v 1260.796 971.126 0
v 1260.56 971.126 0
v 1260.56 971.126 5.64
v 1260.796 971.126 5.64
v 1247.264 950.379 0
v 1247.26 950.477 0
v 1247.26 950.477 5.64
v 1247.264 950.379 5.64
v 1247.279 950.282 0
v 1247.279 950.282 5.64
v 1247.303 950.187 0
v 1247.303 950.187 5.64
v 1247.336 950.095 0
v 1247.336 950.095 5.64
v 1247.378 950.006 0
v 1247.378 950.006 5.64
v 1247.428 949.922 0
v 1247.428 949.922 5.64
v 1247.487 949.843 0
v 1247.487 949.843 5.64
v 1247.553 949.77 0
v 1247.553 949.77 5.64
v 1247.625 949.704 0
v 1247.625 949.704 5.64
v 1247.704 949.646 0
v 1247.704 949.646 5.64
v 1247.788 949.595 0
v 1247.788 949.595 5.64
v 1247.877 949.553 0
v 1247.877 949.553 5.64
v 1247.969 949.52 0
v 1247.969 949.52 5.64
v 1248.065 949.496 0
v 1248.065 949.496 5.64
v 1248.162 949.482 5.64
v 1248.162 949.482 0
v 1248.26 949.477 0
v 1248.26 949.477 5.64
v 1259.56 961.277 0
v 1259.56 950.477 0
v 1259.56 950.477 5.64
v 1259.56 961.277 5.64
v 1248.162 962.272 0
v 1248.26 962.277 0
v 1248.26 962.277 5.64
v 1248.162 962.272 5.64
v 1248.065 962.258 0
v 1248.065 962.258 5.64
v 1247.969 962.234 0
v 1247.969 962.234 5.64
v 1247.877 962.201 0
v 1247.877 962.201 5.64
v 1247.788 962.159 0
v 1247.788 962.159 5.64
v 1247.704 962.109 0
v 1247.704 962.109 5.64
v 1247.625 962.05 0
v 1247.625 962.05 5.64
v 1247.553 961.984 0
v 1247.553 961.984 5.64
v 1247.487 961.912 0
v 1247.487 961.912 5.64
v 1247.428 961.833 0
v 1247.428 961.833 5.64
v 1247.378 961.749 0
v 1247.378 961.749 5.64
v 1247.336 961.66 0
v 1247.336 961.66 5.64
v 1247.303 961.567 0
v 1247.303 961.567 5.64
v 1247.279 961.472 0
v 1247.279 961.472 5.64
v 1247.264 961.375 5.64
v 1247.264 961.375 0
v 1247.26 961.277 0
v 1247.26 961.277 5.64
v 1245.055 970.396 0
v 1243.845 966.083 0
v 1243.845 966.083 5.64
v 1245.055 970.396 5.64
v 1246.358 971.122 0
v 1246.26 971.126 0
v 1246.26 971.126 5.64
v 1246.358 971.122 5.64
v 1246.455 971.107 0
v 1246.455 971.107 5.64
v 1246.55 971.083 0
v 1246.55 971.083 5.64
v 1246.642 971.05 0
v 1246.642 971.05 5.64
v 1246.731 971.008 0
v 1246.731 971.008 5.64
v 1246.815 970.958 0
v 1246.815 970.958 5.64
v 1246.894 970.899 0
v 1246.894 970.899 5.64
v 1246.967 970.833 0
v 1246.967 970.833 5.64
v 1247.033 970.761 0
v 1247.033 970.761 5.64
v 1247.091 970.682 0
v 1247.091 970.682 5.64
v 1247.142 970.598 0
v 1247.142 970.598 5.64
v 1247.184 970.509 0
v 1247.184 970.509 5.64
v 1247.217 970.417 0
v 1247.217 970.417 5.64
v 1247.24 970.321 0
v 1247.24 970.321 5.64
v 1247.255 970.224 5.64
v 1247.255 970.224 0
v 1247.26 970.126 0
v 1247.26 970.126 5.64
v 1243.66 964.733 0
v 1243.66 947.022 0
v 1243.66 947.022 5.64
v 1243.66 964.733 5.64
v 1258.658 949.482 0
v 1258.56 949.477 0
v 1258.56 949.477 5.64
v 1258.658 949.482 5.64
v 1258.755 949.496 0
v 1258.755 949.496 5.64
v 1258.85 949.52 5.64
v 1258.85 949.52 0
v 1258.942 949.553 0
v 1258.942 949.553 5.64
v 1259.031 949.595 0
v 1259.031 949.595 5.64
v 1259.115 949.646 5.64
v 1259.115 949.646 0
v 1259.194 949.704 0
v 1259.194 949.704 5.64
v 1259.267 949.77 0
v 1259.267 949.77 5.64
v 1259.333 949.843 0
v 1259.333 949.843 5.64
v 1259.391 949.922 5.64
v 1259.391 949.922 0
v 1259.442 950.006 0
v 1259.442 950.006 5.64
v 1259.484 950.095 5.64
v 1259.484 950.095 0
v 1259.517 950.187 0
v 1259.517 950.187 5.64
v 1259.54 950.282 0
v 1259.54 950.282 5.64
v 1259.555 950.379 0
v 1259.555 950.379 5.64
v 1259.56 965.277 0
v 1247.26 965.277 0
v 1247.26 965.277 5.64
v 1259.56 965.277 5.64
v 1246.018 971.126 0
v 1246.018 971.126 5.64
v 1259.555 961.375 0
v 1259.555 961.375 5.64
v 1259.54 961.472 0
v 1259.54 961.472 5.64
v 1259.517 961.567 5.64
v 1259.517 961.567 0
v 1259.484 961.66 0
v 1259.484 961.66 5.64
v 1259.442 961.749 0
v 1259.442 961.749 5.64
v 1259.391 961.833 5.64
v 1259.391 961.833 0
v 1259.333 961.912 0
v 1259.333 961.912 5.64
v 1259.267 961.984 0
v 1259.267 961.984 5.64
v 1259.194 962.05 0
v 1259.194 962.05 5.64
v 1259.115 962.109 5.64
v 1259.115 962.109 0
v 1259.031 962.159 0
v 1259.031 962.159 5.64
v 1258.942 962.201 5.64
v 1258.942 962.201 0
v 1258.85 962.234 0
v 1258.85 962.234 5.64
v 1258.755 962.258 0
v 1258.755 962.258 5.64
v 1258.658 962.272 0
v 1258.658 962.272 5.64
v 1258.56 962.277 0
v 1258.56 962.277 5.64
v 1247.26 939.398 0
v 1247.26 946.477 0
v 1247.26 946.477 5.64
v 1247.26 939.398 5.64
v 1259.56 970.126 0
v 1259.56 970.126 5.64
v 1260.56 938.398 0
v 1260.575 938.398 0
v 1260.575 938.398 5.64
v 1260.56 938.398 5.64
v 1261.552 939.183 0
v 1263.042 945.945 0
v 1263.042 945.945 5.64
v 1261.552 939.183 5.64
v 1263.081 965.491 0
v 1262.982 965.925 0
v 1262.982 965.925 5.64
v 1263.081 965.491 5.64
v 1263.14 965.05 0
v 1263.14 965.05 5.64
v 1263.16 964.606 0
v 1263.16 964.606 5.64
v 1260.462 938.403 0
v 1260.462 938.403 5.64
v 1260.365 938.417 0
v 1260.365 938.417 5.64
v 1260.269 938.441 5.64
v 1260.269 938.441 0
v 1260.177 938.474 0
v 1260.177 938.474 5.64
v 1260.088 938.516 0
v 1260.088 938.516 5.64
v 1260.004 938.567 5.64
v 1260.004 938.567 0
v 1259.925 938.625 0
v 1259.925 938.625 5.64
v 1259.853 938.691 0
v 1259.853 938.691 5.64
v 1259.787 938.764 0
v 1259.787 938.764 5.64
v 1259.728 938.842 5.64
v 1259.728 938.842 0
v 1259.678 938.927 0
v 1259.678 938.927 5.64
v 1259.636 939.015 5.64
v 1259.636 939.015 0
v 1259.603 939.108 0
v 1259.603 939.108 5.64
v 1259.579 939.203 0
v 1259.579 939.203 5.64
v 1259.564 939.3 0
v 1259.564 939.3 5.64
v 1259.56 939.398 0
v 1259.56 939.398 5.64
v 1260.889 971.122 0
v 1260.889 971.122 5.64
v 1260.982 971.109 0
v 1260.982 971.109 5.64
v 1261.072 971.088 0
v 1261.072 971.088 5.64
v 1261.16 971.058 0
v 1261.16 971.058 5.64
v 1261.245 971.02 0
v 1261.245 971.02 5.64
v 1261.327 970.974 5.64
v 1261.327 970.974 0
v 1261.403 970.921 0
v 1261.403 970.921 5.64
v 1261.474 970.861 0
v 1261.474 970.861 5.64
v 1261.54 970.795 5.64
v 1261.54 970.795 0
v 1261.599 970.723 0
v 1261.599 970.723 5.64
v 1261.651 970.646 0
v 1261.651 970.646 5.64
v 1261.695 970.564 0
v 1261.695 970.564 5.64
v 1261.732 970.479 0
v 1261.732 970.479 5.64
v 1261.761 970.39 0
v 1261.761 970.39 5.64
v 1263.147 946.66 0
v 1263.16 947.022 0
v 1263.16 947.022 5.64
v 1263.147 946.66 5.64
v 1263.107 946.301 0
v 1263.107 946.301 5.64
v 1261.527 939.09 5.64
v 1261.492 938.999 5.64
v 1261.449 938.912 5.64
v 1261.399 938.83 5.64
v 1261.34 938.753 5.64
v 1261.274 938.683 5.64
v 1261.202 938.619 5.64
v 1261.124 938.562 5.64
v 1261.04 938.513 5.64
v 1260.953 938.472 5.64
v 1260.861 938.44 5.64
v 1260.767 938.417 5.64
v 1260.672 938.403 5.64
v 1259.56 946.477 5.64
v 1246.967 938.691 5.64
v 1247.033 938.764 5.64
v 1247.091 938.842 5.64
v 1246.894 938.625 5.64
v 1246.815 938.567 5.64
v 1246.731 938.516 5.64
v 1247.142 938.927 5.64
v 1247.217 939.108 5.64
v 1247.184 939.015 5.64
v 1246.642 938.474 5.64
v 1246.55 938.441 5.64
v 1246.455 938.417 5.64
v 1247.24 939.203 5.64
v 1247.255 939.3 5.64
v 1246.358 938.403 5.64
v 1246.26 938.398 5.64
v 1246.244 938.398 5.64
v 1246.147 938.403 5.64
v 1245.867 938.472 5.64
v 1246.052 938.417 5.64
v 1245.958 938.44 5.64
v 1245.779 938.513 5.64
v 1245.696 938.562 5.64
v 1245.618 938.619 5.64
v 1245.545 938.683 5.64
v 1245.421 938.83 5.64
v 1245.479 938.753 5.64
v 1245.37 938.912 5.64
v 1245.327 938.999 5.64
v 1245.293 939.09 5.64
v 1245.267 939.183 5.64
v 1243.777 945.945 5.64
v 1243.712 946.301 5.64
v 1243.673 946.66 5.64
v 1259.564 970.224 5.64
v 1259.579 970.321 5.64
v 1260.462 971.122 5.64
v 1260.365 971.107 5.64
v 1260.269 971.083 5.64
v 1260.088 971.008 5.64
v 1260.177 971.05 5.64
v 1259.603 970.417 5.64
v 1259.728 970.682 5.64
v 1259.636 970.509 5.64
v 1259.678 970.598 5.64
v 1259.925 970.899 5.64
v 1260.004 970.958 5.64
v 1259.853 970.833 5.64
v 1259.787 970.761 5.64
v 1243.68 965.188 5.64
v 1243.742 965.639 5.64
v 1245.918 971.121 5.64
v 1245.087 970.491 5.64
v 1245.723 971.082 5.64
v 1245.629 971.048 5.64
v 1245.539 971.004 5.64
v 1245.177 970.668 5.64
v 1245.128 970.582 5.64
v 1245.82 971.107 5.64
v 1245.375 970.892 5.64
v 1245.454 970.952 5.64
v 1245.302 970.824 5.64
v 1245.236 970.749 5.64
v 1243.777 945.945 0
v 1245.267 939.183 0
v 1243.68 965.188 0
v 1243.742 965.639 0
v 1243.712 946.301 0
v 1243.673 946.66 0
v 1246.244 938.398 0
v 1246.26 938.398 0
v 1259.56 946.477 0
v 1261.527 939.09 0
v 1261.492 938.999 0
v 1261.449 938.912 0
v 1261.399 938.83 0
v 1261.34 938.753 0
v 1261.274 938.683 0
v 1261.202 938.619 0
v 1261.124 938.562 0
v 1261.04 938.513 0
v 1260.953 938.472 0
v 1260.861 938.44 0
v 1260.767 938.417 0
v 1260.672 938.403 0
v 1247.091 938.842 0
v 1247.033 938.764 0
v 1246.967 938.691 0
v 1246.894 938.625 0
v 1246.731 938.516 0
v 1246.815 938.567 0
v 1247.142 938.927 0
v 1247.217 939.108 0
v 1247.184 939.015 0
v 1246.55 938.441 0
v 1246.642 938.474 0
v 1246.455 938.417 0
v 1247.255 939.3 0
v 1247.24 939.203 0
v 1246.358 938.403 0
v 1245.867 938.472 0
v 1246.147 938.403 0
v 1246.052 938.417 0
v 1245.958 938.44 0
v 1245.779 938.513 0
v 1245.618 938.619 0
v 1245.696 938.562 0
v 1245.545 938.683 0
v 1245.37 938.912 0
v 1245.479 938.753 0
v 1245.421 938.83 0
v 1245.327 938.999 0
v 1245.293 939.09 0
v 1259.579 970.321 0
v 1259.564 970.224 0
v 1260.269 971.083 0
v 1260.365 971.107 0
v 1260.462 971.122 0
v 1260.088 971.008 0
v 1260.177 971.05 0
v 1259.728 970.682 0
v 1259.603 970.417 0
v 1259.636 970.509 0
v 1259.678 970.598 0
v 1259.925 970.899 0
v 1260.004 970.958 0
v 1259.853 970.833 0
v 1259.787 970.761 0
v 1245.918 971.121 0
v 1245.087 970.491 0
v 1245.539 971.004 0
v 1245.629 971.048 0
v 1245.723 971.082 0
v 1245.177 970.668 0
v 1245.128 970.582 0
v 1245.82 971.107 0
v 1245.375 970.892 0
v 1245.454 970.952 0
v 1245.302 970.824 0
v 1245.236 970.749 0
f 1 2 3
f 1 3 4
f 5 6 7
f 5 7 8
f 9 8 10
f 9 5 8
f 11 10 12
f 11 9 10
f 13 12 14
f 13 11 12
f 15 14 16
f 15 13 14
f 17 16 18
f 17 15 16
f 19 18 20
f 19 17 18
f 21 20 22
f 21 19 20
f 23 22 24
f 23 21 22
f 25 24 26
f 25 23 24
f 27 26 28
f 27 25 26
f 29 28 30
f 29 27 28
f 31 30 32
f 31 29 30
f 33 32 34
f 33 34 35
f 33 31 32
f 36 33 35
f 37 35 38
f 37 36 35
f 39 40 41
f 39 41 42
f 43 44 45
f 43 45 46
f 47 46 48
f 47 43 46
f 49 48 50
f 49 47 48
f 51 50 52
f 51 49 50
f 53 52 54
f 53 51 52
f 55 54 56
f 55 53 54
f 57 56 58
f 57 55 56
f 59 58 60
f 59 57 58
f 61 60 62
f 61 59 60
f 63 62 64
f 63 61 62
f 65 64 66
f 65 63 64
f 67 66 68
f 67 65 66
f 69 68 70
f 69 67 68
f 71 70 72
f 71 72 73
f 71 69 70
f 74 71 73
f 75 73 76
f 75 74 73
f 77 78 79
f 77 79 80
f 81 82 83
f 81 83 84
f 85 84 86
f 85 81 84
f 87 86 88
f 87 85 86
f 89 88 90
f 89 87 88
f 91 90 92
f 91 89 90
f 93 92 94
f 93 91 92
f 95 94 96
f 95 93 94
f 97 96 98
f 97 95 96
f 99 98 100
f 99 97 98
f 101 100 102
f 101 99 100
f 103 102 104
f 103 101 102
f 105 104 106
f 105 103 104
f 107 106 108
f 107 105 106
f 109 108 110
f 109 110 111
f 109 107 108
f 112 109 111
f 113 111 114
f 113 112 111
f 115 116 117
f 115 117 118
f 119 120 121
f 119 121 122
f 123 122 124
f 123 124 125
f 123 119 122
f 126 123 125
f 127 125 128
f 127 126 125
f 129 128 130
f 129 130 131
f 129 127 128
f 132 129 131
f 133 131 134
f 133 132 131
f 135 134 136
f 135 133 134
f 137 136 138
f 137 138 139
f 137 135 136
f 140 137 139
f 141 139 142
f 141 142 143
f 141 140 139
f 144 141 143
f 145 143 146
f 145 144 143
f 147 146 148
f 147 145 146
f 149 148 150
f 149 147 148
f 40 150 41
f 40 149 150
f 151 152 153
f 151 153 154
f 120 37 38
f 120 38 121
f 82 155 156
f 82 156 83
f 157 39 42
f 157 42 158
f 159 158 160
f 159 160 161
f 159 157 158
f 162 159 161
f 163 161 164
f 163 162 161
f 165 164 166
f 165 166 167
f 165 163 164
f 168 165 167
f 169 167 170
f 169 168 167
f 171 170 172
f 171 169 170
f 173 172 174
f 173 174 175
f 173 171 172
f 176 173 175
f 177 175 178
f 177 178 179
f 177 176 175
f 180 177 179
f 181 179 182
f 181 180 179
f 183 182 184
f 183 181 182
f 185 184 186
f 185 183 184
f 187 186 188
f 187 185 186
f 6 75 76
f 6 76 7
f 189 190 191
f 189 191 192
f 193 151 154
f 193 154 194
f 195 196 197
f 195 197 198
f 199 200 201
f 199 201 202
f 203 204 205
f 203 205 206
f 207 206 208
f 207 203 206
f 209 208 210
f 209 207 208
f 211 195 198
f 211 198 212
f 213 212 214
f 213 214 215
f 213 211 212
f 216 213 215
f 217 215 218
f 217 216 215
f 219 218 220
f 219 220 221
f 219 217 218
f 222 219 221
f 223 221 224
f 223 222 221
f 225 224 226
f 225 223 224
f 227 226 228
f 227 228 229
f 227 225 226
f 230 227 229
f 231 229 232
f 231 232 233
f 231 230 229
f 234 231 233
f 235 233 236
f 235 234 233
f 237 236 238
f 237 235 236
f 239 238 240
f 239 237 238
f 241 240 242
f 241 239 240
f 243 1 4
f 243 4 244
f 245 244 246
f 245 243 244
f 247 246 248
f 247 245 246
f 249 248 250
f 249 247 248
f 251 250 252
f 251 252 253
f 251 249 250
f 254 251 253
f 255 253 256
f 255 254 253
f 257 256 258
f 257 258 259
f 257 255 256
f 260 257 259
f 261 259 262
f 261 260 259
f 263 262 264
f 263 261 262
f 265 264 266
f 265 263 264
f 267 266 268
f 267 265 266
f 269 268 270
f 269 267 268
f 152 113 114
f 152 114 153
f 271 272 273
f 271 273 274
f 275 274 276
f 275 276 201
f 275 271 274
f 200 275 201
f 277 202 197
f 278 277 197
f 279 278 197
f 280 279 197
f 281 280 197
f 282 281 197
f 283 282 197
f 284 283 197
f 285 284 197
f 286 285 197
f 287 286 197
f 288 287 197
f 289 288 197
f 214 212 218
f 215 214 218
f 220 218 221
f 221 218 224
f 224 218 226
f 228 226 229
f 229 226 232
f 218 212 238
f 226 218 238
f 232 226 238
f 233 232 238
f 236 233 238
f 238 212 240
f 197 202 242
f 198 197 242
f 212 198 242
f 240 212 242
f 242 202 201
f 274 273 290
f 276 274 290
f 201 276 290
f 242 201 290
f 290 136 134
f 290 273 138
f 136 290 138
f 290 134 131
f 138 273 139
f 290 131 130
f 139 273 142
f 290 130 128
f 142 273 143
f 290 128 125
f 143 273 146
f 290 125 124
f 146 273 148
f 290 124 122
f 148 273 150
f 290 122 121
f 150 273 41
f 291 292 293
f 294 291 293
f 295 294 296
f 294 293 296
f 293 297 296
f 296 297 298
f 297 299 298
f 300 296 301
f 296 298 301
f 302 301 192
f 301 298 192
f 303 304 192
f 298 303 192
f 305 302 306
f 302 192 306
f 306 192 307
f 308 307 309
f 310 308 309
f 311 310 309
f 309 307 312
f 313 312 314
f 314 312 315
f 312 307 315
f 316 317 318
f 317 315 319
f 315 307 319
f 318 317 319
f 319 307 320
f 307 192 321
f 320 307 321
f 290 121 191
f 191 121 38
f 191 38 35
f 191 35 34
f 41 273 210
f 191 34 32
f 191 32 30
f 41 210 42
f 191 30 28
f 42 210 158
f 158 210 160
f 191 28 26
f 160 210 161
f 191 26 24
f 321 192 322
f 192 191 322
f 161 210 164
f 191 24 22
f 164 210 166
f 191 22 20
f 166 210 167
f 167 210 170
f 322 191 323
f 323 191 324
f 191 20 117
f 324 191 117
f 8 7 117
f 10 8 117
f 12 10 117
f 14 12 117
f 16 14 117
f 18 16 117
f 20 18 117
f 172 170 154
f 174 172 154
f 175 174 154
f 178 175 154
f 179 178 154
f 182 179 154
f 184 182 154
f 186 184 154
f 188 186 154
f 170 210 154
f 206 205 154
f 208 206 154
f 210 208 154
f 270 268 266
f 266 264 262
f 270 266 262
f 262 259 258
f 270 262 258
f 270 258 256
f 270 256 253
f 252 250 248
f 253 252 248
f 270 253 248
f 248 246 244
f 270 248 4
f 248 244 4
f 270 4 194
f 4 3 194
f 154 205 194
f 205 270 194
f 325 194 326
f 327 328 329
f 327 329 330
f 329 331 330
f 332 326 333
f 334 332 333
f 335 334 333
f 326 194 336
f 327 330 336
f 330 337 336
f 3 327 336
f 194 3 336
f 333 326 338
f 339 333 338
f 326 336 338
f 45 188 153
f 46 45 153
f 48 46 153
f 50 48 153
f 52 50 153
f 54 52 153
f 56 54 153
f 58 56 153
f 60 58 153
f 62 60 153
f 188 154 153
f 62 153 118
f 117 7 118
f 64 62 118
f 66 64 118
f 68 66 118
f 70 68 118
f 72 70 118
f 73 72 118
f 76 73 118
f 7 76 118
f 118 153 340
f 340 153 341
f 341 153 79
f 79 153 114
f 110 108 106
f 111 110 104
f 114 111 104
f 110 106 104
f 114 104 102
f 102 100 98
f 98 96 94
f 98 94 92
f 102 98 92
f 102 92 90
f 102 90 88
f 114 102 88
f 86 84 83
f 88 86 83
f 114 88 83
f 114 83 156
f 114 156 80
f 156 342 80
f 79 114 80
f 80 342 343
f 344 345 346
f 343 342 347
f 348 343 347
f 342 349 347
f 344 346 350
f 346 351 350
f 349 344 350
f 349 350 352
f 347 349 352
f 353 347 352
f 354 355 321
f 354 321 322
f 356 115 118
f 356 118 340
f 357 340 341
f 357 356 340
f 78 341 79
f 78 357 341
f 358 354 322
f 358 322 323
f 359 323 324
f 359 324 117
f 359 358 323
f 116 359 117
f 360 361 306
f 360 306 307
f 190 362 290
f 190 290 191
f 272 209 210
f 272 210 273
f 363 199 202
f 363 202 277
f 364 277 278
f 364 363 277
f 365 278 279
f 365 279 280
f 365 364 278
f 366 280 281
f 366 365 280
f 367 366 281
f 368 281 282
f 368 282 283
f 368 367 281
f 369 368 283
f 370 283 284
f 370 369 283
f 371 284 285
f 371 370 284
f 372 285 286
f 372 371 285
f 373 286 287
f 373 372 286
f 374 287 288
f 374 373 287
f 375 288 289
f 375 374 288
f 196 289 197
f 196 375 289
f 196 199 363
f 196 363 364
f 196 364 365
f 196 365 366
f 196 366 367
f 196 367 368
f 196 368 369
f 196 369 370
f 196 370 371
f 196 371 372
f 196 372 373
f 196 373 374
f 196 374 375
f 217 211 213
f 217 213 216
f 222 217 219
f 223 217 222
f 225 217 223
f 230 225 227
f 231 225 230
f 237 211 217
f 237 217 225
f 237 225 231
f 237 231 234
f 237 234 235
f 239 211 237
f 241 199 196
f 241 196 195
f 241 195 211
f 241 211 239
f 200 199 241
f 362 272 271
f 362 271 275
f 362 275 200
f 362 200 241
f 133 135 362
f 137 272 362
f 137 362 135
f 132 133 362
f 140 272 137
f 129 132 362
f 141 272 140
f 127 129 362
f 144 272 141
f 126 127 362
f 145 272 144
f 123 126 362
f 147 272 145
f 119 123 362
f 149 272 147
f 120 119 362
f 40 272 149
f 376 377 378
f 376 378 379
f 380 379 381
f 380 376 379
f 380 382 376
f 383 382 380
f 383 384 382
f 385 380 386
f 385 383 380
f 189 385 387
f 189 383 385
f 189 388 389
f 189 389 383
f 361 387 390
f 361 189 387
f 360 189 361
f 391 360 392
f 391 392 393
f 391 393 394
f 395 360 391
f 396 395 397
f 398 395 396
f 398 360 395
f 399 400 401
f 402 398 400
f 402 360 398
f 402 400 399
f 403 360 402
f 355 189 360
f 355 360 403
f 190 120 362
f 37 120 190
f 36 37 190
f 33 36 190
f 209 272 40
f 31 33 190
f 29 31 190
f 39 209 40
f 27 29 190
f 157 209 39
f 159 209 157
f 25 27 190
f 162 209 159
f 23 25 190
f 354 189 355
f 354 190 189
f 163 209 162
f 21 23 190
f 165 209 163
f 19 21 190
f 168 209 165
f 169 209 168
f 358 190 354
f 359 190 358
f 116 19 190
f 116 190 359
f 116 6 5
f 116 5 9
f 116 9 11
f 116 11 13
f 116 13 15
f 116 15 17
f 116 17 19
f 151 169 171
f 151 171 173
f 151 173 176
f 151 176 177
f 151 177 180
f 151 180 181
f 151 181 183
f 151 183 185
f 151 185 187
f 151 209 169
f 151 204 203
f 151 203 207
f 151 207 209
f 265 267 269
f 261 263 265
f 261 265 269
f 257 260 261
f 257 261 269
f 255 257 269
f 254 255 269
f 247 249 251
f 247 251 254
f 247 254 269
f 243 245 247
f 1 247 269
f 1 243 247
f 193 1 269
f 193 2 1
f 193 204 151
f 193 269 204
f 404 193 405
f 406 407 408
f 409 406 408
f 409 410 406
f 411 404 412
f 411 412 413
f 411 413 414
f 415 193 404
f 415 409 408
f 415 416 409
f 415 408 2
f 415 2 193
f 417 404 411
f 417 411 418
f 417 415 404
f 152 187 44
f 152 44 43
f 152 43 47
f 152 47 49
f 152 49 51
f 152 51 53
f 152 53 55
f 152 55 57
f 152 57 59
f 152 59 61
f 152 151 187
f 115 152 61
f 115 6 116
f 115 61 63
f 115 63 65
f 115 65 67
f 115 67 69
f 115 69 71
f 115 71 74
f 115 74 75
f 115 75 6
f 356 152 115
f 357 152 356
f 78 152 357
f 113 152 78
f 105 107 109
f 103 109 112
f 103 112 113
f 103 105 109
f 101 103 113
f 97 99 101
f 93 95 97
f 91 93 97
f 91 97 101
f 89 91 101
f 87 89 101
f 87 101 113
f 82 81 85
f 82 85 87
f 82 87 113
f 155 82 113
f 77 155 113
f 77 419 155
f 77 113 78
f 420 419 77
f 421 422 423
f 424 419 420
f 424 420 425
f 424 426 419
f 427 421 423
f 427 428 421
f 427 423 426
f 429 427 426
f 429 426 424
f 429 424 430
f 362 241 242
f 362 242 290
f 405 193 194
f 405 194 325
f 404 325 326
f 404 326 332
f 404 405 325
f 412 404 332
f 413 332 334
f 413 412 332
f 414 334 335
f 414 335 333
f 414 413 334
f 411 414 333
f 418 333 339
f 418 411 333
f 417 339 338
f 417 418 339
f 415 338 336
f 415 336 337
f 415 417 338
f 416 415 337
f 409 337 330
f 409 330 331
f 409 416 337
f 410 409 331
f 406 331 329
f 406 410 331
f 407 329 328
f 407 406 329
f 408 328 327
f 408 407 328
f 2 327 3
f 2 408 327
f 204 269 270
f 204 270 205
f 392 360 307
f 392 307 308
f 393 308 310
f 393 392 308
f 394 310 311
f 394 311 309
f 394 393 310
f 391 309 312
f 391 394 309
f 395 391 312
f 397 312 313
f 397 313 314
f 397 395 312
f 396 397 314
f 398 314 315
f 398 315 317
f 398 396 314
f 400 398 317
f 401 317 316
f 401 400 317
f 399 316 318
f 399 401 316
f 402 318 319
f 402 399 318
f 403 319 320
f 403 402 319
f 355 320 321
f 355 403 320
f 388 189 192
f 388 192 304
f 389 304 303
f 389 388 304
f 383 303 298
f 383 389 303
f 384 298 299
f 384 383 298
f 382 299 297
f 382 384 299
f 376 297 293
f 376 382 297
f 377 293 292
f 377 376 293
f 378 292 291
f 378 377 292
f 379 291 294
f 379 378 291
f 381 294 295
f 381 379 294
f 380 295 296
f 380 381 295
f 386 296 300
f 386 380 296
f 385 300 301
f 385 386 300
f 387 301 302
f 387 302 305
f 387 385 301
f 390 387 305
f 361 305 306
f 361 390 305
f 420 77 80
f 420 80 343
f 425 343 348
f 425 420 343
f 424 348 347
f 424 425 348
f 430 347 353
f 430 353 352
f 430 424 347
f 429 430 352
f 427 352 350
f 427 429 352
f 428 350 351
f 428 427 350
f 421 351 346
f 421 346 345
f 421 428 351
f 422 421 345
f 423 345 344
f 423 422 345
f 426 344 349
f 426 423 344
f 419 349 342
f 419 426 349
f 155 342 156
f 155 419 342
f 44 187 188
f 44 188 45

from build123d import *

# Parameters (mm, degrees)
BOSS_EXTRUDE1_DEPTH = 5.64


with BuildPart() as part:
    # Sketch1 → Boss-Extrude1 (new body)
    with BuildSketch(Plane.XY):
        with BuildLine():
            Line((1246.017783232, 971.126361431), (1246.259623553, 971.126361431))
            ThreePointArc((1246.259623553, 971.126361431), (1246.966730334, 970.833468212), (1247.259623553, 970.126361431))
            Line((1247.259623553, 970.126361431), (1247.259623553, 965.277195661))
            Line((1247.259623553, 965.277195661), (1259.559623553, 965.277195661))
            Line((1259.559623553, 965.277195661), (1259.559623553, 970.126361431))
            ThreePointArc((1259.559623553, 970.126361431), (1259.852516772, 970.833468212), (1260.559623553, 971.126361431))
            Line((1260.559623553, 971.126361431), (1260.796428716, 971.126361431))
            ThreePointArc((1260.796428716, 971.126361431), (1261.403120593, 970.921298514), (1261.760992458, 970.390211362))
            Line((1261.760992458, 970.390211362), (1262.982442266, 965.92492236))
            ThreePointArc((1262.982442266, 965.92492236), (1263.115130266, 965.271220008), (1263.159623553, 964.605672702))
            Line((1263.159623553, 964.605672702), (1263.159623553, 947.021688584))
            ThreePointArc((1263.159623553, 947.021688584), (1263.130237407, 946.480395771), (1263.042424389, 945.945465561))
            Line((1263.042424389, 945.945465561), (1261.551855255, 939.182785286))
            ThreePointArc((1261.551855255, 939.182785286), (1261.201695677, 938.618528574), (1260.575295088, 938.398029891))
            Line((1260.575295088, 938.398029891), (1260.559623553, 938.398029891))
            ThreePointArc((1260.559623553, 938.398029891), (1259.852516772, 938.69092311), (1259.559623553, 939.398029891))
            Line((1259.559623553, 939.398029891), (1259.559623553, 946.477195661))
            Line((1259.559623553, 946.477195661), (1247.259623553, 946.477195661))
            Line((1247.259623553, 946.477195661), (1247.259623553, 939.398029891))
            ThreePointArc((1247.259623553, 939.398029891), (1246.966730334, 938.69092311), (1246.259623553, 938.398029891))
            Line((1246.259623553, 938.398029891), (1246.243952018, 938.398029891))
            ThreePointArc((1246.243952018, 938.398029891), (1245.617551429, 938.618528574), (1245.267391851, 939.182785286))
            Line((1245.267391851, 939.182785286), (1243.776822717, 945.945465561))
            ThreePointArc((1243.776822717, 945.945465561), (1243.689009698, 946.480395771), (1243.659623553, 947.021688584))
            Line((1243.659623553, 947.021688584), (1243.659623553, 964.732702737))
            ThreePointArc((1243.659623553, 964.732702737), (1243.706264857, 965.414052599), (1243.845318606, 966.082690842))
            Line((1243.845318606, 966.082690842), (1245.054922243, 970.396359052))
            ThreePointArc((1245.054922243, 970.396359052), (1245.413629949, 970.923229557), (1246.017783232, 971.126361431))
        make_face()
        with BuildLine():
            Line((1247.259623553, 961.277195661), (1247.259623553, 950.477195661))
            ThreePointArc((1247.259623553, 950.477195661), (1247.552516772, 949.77008888), (1248.259623553, 949.477195661))
            Line((1248.259623553, 949.477195661), (1258.559623553, 949.477195661))
            ThreePointArc((1258.559623553, 949.477195661), (1259.266730334, 949.77008888), (1259.559623553, 950.477195661))
            Line((1259.559623553, 950.477195661), (1259.559623553, 961.277195661))
            ThreePointArc((1259.559623553, 961.277195661), (1259.266730334, 961.984302442), (1258.559623553, 962.277195661))
            Line((1258.559623553, 962.277195661), (1248.259623553, 962.277195661))
            ThreePointArc((1248.259623553, 962.277195661), (1247.552516772, 961.984302442), (1247.259623553, 961.277195661))
        make_face(mode=Mode.SUBTRACT)
    extrude(amount=BOSS_EXTRUDE1_DEPTH)


solid = part.part
